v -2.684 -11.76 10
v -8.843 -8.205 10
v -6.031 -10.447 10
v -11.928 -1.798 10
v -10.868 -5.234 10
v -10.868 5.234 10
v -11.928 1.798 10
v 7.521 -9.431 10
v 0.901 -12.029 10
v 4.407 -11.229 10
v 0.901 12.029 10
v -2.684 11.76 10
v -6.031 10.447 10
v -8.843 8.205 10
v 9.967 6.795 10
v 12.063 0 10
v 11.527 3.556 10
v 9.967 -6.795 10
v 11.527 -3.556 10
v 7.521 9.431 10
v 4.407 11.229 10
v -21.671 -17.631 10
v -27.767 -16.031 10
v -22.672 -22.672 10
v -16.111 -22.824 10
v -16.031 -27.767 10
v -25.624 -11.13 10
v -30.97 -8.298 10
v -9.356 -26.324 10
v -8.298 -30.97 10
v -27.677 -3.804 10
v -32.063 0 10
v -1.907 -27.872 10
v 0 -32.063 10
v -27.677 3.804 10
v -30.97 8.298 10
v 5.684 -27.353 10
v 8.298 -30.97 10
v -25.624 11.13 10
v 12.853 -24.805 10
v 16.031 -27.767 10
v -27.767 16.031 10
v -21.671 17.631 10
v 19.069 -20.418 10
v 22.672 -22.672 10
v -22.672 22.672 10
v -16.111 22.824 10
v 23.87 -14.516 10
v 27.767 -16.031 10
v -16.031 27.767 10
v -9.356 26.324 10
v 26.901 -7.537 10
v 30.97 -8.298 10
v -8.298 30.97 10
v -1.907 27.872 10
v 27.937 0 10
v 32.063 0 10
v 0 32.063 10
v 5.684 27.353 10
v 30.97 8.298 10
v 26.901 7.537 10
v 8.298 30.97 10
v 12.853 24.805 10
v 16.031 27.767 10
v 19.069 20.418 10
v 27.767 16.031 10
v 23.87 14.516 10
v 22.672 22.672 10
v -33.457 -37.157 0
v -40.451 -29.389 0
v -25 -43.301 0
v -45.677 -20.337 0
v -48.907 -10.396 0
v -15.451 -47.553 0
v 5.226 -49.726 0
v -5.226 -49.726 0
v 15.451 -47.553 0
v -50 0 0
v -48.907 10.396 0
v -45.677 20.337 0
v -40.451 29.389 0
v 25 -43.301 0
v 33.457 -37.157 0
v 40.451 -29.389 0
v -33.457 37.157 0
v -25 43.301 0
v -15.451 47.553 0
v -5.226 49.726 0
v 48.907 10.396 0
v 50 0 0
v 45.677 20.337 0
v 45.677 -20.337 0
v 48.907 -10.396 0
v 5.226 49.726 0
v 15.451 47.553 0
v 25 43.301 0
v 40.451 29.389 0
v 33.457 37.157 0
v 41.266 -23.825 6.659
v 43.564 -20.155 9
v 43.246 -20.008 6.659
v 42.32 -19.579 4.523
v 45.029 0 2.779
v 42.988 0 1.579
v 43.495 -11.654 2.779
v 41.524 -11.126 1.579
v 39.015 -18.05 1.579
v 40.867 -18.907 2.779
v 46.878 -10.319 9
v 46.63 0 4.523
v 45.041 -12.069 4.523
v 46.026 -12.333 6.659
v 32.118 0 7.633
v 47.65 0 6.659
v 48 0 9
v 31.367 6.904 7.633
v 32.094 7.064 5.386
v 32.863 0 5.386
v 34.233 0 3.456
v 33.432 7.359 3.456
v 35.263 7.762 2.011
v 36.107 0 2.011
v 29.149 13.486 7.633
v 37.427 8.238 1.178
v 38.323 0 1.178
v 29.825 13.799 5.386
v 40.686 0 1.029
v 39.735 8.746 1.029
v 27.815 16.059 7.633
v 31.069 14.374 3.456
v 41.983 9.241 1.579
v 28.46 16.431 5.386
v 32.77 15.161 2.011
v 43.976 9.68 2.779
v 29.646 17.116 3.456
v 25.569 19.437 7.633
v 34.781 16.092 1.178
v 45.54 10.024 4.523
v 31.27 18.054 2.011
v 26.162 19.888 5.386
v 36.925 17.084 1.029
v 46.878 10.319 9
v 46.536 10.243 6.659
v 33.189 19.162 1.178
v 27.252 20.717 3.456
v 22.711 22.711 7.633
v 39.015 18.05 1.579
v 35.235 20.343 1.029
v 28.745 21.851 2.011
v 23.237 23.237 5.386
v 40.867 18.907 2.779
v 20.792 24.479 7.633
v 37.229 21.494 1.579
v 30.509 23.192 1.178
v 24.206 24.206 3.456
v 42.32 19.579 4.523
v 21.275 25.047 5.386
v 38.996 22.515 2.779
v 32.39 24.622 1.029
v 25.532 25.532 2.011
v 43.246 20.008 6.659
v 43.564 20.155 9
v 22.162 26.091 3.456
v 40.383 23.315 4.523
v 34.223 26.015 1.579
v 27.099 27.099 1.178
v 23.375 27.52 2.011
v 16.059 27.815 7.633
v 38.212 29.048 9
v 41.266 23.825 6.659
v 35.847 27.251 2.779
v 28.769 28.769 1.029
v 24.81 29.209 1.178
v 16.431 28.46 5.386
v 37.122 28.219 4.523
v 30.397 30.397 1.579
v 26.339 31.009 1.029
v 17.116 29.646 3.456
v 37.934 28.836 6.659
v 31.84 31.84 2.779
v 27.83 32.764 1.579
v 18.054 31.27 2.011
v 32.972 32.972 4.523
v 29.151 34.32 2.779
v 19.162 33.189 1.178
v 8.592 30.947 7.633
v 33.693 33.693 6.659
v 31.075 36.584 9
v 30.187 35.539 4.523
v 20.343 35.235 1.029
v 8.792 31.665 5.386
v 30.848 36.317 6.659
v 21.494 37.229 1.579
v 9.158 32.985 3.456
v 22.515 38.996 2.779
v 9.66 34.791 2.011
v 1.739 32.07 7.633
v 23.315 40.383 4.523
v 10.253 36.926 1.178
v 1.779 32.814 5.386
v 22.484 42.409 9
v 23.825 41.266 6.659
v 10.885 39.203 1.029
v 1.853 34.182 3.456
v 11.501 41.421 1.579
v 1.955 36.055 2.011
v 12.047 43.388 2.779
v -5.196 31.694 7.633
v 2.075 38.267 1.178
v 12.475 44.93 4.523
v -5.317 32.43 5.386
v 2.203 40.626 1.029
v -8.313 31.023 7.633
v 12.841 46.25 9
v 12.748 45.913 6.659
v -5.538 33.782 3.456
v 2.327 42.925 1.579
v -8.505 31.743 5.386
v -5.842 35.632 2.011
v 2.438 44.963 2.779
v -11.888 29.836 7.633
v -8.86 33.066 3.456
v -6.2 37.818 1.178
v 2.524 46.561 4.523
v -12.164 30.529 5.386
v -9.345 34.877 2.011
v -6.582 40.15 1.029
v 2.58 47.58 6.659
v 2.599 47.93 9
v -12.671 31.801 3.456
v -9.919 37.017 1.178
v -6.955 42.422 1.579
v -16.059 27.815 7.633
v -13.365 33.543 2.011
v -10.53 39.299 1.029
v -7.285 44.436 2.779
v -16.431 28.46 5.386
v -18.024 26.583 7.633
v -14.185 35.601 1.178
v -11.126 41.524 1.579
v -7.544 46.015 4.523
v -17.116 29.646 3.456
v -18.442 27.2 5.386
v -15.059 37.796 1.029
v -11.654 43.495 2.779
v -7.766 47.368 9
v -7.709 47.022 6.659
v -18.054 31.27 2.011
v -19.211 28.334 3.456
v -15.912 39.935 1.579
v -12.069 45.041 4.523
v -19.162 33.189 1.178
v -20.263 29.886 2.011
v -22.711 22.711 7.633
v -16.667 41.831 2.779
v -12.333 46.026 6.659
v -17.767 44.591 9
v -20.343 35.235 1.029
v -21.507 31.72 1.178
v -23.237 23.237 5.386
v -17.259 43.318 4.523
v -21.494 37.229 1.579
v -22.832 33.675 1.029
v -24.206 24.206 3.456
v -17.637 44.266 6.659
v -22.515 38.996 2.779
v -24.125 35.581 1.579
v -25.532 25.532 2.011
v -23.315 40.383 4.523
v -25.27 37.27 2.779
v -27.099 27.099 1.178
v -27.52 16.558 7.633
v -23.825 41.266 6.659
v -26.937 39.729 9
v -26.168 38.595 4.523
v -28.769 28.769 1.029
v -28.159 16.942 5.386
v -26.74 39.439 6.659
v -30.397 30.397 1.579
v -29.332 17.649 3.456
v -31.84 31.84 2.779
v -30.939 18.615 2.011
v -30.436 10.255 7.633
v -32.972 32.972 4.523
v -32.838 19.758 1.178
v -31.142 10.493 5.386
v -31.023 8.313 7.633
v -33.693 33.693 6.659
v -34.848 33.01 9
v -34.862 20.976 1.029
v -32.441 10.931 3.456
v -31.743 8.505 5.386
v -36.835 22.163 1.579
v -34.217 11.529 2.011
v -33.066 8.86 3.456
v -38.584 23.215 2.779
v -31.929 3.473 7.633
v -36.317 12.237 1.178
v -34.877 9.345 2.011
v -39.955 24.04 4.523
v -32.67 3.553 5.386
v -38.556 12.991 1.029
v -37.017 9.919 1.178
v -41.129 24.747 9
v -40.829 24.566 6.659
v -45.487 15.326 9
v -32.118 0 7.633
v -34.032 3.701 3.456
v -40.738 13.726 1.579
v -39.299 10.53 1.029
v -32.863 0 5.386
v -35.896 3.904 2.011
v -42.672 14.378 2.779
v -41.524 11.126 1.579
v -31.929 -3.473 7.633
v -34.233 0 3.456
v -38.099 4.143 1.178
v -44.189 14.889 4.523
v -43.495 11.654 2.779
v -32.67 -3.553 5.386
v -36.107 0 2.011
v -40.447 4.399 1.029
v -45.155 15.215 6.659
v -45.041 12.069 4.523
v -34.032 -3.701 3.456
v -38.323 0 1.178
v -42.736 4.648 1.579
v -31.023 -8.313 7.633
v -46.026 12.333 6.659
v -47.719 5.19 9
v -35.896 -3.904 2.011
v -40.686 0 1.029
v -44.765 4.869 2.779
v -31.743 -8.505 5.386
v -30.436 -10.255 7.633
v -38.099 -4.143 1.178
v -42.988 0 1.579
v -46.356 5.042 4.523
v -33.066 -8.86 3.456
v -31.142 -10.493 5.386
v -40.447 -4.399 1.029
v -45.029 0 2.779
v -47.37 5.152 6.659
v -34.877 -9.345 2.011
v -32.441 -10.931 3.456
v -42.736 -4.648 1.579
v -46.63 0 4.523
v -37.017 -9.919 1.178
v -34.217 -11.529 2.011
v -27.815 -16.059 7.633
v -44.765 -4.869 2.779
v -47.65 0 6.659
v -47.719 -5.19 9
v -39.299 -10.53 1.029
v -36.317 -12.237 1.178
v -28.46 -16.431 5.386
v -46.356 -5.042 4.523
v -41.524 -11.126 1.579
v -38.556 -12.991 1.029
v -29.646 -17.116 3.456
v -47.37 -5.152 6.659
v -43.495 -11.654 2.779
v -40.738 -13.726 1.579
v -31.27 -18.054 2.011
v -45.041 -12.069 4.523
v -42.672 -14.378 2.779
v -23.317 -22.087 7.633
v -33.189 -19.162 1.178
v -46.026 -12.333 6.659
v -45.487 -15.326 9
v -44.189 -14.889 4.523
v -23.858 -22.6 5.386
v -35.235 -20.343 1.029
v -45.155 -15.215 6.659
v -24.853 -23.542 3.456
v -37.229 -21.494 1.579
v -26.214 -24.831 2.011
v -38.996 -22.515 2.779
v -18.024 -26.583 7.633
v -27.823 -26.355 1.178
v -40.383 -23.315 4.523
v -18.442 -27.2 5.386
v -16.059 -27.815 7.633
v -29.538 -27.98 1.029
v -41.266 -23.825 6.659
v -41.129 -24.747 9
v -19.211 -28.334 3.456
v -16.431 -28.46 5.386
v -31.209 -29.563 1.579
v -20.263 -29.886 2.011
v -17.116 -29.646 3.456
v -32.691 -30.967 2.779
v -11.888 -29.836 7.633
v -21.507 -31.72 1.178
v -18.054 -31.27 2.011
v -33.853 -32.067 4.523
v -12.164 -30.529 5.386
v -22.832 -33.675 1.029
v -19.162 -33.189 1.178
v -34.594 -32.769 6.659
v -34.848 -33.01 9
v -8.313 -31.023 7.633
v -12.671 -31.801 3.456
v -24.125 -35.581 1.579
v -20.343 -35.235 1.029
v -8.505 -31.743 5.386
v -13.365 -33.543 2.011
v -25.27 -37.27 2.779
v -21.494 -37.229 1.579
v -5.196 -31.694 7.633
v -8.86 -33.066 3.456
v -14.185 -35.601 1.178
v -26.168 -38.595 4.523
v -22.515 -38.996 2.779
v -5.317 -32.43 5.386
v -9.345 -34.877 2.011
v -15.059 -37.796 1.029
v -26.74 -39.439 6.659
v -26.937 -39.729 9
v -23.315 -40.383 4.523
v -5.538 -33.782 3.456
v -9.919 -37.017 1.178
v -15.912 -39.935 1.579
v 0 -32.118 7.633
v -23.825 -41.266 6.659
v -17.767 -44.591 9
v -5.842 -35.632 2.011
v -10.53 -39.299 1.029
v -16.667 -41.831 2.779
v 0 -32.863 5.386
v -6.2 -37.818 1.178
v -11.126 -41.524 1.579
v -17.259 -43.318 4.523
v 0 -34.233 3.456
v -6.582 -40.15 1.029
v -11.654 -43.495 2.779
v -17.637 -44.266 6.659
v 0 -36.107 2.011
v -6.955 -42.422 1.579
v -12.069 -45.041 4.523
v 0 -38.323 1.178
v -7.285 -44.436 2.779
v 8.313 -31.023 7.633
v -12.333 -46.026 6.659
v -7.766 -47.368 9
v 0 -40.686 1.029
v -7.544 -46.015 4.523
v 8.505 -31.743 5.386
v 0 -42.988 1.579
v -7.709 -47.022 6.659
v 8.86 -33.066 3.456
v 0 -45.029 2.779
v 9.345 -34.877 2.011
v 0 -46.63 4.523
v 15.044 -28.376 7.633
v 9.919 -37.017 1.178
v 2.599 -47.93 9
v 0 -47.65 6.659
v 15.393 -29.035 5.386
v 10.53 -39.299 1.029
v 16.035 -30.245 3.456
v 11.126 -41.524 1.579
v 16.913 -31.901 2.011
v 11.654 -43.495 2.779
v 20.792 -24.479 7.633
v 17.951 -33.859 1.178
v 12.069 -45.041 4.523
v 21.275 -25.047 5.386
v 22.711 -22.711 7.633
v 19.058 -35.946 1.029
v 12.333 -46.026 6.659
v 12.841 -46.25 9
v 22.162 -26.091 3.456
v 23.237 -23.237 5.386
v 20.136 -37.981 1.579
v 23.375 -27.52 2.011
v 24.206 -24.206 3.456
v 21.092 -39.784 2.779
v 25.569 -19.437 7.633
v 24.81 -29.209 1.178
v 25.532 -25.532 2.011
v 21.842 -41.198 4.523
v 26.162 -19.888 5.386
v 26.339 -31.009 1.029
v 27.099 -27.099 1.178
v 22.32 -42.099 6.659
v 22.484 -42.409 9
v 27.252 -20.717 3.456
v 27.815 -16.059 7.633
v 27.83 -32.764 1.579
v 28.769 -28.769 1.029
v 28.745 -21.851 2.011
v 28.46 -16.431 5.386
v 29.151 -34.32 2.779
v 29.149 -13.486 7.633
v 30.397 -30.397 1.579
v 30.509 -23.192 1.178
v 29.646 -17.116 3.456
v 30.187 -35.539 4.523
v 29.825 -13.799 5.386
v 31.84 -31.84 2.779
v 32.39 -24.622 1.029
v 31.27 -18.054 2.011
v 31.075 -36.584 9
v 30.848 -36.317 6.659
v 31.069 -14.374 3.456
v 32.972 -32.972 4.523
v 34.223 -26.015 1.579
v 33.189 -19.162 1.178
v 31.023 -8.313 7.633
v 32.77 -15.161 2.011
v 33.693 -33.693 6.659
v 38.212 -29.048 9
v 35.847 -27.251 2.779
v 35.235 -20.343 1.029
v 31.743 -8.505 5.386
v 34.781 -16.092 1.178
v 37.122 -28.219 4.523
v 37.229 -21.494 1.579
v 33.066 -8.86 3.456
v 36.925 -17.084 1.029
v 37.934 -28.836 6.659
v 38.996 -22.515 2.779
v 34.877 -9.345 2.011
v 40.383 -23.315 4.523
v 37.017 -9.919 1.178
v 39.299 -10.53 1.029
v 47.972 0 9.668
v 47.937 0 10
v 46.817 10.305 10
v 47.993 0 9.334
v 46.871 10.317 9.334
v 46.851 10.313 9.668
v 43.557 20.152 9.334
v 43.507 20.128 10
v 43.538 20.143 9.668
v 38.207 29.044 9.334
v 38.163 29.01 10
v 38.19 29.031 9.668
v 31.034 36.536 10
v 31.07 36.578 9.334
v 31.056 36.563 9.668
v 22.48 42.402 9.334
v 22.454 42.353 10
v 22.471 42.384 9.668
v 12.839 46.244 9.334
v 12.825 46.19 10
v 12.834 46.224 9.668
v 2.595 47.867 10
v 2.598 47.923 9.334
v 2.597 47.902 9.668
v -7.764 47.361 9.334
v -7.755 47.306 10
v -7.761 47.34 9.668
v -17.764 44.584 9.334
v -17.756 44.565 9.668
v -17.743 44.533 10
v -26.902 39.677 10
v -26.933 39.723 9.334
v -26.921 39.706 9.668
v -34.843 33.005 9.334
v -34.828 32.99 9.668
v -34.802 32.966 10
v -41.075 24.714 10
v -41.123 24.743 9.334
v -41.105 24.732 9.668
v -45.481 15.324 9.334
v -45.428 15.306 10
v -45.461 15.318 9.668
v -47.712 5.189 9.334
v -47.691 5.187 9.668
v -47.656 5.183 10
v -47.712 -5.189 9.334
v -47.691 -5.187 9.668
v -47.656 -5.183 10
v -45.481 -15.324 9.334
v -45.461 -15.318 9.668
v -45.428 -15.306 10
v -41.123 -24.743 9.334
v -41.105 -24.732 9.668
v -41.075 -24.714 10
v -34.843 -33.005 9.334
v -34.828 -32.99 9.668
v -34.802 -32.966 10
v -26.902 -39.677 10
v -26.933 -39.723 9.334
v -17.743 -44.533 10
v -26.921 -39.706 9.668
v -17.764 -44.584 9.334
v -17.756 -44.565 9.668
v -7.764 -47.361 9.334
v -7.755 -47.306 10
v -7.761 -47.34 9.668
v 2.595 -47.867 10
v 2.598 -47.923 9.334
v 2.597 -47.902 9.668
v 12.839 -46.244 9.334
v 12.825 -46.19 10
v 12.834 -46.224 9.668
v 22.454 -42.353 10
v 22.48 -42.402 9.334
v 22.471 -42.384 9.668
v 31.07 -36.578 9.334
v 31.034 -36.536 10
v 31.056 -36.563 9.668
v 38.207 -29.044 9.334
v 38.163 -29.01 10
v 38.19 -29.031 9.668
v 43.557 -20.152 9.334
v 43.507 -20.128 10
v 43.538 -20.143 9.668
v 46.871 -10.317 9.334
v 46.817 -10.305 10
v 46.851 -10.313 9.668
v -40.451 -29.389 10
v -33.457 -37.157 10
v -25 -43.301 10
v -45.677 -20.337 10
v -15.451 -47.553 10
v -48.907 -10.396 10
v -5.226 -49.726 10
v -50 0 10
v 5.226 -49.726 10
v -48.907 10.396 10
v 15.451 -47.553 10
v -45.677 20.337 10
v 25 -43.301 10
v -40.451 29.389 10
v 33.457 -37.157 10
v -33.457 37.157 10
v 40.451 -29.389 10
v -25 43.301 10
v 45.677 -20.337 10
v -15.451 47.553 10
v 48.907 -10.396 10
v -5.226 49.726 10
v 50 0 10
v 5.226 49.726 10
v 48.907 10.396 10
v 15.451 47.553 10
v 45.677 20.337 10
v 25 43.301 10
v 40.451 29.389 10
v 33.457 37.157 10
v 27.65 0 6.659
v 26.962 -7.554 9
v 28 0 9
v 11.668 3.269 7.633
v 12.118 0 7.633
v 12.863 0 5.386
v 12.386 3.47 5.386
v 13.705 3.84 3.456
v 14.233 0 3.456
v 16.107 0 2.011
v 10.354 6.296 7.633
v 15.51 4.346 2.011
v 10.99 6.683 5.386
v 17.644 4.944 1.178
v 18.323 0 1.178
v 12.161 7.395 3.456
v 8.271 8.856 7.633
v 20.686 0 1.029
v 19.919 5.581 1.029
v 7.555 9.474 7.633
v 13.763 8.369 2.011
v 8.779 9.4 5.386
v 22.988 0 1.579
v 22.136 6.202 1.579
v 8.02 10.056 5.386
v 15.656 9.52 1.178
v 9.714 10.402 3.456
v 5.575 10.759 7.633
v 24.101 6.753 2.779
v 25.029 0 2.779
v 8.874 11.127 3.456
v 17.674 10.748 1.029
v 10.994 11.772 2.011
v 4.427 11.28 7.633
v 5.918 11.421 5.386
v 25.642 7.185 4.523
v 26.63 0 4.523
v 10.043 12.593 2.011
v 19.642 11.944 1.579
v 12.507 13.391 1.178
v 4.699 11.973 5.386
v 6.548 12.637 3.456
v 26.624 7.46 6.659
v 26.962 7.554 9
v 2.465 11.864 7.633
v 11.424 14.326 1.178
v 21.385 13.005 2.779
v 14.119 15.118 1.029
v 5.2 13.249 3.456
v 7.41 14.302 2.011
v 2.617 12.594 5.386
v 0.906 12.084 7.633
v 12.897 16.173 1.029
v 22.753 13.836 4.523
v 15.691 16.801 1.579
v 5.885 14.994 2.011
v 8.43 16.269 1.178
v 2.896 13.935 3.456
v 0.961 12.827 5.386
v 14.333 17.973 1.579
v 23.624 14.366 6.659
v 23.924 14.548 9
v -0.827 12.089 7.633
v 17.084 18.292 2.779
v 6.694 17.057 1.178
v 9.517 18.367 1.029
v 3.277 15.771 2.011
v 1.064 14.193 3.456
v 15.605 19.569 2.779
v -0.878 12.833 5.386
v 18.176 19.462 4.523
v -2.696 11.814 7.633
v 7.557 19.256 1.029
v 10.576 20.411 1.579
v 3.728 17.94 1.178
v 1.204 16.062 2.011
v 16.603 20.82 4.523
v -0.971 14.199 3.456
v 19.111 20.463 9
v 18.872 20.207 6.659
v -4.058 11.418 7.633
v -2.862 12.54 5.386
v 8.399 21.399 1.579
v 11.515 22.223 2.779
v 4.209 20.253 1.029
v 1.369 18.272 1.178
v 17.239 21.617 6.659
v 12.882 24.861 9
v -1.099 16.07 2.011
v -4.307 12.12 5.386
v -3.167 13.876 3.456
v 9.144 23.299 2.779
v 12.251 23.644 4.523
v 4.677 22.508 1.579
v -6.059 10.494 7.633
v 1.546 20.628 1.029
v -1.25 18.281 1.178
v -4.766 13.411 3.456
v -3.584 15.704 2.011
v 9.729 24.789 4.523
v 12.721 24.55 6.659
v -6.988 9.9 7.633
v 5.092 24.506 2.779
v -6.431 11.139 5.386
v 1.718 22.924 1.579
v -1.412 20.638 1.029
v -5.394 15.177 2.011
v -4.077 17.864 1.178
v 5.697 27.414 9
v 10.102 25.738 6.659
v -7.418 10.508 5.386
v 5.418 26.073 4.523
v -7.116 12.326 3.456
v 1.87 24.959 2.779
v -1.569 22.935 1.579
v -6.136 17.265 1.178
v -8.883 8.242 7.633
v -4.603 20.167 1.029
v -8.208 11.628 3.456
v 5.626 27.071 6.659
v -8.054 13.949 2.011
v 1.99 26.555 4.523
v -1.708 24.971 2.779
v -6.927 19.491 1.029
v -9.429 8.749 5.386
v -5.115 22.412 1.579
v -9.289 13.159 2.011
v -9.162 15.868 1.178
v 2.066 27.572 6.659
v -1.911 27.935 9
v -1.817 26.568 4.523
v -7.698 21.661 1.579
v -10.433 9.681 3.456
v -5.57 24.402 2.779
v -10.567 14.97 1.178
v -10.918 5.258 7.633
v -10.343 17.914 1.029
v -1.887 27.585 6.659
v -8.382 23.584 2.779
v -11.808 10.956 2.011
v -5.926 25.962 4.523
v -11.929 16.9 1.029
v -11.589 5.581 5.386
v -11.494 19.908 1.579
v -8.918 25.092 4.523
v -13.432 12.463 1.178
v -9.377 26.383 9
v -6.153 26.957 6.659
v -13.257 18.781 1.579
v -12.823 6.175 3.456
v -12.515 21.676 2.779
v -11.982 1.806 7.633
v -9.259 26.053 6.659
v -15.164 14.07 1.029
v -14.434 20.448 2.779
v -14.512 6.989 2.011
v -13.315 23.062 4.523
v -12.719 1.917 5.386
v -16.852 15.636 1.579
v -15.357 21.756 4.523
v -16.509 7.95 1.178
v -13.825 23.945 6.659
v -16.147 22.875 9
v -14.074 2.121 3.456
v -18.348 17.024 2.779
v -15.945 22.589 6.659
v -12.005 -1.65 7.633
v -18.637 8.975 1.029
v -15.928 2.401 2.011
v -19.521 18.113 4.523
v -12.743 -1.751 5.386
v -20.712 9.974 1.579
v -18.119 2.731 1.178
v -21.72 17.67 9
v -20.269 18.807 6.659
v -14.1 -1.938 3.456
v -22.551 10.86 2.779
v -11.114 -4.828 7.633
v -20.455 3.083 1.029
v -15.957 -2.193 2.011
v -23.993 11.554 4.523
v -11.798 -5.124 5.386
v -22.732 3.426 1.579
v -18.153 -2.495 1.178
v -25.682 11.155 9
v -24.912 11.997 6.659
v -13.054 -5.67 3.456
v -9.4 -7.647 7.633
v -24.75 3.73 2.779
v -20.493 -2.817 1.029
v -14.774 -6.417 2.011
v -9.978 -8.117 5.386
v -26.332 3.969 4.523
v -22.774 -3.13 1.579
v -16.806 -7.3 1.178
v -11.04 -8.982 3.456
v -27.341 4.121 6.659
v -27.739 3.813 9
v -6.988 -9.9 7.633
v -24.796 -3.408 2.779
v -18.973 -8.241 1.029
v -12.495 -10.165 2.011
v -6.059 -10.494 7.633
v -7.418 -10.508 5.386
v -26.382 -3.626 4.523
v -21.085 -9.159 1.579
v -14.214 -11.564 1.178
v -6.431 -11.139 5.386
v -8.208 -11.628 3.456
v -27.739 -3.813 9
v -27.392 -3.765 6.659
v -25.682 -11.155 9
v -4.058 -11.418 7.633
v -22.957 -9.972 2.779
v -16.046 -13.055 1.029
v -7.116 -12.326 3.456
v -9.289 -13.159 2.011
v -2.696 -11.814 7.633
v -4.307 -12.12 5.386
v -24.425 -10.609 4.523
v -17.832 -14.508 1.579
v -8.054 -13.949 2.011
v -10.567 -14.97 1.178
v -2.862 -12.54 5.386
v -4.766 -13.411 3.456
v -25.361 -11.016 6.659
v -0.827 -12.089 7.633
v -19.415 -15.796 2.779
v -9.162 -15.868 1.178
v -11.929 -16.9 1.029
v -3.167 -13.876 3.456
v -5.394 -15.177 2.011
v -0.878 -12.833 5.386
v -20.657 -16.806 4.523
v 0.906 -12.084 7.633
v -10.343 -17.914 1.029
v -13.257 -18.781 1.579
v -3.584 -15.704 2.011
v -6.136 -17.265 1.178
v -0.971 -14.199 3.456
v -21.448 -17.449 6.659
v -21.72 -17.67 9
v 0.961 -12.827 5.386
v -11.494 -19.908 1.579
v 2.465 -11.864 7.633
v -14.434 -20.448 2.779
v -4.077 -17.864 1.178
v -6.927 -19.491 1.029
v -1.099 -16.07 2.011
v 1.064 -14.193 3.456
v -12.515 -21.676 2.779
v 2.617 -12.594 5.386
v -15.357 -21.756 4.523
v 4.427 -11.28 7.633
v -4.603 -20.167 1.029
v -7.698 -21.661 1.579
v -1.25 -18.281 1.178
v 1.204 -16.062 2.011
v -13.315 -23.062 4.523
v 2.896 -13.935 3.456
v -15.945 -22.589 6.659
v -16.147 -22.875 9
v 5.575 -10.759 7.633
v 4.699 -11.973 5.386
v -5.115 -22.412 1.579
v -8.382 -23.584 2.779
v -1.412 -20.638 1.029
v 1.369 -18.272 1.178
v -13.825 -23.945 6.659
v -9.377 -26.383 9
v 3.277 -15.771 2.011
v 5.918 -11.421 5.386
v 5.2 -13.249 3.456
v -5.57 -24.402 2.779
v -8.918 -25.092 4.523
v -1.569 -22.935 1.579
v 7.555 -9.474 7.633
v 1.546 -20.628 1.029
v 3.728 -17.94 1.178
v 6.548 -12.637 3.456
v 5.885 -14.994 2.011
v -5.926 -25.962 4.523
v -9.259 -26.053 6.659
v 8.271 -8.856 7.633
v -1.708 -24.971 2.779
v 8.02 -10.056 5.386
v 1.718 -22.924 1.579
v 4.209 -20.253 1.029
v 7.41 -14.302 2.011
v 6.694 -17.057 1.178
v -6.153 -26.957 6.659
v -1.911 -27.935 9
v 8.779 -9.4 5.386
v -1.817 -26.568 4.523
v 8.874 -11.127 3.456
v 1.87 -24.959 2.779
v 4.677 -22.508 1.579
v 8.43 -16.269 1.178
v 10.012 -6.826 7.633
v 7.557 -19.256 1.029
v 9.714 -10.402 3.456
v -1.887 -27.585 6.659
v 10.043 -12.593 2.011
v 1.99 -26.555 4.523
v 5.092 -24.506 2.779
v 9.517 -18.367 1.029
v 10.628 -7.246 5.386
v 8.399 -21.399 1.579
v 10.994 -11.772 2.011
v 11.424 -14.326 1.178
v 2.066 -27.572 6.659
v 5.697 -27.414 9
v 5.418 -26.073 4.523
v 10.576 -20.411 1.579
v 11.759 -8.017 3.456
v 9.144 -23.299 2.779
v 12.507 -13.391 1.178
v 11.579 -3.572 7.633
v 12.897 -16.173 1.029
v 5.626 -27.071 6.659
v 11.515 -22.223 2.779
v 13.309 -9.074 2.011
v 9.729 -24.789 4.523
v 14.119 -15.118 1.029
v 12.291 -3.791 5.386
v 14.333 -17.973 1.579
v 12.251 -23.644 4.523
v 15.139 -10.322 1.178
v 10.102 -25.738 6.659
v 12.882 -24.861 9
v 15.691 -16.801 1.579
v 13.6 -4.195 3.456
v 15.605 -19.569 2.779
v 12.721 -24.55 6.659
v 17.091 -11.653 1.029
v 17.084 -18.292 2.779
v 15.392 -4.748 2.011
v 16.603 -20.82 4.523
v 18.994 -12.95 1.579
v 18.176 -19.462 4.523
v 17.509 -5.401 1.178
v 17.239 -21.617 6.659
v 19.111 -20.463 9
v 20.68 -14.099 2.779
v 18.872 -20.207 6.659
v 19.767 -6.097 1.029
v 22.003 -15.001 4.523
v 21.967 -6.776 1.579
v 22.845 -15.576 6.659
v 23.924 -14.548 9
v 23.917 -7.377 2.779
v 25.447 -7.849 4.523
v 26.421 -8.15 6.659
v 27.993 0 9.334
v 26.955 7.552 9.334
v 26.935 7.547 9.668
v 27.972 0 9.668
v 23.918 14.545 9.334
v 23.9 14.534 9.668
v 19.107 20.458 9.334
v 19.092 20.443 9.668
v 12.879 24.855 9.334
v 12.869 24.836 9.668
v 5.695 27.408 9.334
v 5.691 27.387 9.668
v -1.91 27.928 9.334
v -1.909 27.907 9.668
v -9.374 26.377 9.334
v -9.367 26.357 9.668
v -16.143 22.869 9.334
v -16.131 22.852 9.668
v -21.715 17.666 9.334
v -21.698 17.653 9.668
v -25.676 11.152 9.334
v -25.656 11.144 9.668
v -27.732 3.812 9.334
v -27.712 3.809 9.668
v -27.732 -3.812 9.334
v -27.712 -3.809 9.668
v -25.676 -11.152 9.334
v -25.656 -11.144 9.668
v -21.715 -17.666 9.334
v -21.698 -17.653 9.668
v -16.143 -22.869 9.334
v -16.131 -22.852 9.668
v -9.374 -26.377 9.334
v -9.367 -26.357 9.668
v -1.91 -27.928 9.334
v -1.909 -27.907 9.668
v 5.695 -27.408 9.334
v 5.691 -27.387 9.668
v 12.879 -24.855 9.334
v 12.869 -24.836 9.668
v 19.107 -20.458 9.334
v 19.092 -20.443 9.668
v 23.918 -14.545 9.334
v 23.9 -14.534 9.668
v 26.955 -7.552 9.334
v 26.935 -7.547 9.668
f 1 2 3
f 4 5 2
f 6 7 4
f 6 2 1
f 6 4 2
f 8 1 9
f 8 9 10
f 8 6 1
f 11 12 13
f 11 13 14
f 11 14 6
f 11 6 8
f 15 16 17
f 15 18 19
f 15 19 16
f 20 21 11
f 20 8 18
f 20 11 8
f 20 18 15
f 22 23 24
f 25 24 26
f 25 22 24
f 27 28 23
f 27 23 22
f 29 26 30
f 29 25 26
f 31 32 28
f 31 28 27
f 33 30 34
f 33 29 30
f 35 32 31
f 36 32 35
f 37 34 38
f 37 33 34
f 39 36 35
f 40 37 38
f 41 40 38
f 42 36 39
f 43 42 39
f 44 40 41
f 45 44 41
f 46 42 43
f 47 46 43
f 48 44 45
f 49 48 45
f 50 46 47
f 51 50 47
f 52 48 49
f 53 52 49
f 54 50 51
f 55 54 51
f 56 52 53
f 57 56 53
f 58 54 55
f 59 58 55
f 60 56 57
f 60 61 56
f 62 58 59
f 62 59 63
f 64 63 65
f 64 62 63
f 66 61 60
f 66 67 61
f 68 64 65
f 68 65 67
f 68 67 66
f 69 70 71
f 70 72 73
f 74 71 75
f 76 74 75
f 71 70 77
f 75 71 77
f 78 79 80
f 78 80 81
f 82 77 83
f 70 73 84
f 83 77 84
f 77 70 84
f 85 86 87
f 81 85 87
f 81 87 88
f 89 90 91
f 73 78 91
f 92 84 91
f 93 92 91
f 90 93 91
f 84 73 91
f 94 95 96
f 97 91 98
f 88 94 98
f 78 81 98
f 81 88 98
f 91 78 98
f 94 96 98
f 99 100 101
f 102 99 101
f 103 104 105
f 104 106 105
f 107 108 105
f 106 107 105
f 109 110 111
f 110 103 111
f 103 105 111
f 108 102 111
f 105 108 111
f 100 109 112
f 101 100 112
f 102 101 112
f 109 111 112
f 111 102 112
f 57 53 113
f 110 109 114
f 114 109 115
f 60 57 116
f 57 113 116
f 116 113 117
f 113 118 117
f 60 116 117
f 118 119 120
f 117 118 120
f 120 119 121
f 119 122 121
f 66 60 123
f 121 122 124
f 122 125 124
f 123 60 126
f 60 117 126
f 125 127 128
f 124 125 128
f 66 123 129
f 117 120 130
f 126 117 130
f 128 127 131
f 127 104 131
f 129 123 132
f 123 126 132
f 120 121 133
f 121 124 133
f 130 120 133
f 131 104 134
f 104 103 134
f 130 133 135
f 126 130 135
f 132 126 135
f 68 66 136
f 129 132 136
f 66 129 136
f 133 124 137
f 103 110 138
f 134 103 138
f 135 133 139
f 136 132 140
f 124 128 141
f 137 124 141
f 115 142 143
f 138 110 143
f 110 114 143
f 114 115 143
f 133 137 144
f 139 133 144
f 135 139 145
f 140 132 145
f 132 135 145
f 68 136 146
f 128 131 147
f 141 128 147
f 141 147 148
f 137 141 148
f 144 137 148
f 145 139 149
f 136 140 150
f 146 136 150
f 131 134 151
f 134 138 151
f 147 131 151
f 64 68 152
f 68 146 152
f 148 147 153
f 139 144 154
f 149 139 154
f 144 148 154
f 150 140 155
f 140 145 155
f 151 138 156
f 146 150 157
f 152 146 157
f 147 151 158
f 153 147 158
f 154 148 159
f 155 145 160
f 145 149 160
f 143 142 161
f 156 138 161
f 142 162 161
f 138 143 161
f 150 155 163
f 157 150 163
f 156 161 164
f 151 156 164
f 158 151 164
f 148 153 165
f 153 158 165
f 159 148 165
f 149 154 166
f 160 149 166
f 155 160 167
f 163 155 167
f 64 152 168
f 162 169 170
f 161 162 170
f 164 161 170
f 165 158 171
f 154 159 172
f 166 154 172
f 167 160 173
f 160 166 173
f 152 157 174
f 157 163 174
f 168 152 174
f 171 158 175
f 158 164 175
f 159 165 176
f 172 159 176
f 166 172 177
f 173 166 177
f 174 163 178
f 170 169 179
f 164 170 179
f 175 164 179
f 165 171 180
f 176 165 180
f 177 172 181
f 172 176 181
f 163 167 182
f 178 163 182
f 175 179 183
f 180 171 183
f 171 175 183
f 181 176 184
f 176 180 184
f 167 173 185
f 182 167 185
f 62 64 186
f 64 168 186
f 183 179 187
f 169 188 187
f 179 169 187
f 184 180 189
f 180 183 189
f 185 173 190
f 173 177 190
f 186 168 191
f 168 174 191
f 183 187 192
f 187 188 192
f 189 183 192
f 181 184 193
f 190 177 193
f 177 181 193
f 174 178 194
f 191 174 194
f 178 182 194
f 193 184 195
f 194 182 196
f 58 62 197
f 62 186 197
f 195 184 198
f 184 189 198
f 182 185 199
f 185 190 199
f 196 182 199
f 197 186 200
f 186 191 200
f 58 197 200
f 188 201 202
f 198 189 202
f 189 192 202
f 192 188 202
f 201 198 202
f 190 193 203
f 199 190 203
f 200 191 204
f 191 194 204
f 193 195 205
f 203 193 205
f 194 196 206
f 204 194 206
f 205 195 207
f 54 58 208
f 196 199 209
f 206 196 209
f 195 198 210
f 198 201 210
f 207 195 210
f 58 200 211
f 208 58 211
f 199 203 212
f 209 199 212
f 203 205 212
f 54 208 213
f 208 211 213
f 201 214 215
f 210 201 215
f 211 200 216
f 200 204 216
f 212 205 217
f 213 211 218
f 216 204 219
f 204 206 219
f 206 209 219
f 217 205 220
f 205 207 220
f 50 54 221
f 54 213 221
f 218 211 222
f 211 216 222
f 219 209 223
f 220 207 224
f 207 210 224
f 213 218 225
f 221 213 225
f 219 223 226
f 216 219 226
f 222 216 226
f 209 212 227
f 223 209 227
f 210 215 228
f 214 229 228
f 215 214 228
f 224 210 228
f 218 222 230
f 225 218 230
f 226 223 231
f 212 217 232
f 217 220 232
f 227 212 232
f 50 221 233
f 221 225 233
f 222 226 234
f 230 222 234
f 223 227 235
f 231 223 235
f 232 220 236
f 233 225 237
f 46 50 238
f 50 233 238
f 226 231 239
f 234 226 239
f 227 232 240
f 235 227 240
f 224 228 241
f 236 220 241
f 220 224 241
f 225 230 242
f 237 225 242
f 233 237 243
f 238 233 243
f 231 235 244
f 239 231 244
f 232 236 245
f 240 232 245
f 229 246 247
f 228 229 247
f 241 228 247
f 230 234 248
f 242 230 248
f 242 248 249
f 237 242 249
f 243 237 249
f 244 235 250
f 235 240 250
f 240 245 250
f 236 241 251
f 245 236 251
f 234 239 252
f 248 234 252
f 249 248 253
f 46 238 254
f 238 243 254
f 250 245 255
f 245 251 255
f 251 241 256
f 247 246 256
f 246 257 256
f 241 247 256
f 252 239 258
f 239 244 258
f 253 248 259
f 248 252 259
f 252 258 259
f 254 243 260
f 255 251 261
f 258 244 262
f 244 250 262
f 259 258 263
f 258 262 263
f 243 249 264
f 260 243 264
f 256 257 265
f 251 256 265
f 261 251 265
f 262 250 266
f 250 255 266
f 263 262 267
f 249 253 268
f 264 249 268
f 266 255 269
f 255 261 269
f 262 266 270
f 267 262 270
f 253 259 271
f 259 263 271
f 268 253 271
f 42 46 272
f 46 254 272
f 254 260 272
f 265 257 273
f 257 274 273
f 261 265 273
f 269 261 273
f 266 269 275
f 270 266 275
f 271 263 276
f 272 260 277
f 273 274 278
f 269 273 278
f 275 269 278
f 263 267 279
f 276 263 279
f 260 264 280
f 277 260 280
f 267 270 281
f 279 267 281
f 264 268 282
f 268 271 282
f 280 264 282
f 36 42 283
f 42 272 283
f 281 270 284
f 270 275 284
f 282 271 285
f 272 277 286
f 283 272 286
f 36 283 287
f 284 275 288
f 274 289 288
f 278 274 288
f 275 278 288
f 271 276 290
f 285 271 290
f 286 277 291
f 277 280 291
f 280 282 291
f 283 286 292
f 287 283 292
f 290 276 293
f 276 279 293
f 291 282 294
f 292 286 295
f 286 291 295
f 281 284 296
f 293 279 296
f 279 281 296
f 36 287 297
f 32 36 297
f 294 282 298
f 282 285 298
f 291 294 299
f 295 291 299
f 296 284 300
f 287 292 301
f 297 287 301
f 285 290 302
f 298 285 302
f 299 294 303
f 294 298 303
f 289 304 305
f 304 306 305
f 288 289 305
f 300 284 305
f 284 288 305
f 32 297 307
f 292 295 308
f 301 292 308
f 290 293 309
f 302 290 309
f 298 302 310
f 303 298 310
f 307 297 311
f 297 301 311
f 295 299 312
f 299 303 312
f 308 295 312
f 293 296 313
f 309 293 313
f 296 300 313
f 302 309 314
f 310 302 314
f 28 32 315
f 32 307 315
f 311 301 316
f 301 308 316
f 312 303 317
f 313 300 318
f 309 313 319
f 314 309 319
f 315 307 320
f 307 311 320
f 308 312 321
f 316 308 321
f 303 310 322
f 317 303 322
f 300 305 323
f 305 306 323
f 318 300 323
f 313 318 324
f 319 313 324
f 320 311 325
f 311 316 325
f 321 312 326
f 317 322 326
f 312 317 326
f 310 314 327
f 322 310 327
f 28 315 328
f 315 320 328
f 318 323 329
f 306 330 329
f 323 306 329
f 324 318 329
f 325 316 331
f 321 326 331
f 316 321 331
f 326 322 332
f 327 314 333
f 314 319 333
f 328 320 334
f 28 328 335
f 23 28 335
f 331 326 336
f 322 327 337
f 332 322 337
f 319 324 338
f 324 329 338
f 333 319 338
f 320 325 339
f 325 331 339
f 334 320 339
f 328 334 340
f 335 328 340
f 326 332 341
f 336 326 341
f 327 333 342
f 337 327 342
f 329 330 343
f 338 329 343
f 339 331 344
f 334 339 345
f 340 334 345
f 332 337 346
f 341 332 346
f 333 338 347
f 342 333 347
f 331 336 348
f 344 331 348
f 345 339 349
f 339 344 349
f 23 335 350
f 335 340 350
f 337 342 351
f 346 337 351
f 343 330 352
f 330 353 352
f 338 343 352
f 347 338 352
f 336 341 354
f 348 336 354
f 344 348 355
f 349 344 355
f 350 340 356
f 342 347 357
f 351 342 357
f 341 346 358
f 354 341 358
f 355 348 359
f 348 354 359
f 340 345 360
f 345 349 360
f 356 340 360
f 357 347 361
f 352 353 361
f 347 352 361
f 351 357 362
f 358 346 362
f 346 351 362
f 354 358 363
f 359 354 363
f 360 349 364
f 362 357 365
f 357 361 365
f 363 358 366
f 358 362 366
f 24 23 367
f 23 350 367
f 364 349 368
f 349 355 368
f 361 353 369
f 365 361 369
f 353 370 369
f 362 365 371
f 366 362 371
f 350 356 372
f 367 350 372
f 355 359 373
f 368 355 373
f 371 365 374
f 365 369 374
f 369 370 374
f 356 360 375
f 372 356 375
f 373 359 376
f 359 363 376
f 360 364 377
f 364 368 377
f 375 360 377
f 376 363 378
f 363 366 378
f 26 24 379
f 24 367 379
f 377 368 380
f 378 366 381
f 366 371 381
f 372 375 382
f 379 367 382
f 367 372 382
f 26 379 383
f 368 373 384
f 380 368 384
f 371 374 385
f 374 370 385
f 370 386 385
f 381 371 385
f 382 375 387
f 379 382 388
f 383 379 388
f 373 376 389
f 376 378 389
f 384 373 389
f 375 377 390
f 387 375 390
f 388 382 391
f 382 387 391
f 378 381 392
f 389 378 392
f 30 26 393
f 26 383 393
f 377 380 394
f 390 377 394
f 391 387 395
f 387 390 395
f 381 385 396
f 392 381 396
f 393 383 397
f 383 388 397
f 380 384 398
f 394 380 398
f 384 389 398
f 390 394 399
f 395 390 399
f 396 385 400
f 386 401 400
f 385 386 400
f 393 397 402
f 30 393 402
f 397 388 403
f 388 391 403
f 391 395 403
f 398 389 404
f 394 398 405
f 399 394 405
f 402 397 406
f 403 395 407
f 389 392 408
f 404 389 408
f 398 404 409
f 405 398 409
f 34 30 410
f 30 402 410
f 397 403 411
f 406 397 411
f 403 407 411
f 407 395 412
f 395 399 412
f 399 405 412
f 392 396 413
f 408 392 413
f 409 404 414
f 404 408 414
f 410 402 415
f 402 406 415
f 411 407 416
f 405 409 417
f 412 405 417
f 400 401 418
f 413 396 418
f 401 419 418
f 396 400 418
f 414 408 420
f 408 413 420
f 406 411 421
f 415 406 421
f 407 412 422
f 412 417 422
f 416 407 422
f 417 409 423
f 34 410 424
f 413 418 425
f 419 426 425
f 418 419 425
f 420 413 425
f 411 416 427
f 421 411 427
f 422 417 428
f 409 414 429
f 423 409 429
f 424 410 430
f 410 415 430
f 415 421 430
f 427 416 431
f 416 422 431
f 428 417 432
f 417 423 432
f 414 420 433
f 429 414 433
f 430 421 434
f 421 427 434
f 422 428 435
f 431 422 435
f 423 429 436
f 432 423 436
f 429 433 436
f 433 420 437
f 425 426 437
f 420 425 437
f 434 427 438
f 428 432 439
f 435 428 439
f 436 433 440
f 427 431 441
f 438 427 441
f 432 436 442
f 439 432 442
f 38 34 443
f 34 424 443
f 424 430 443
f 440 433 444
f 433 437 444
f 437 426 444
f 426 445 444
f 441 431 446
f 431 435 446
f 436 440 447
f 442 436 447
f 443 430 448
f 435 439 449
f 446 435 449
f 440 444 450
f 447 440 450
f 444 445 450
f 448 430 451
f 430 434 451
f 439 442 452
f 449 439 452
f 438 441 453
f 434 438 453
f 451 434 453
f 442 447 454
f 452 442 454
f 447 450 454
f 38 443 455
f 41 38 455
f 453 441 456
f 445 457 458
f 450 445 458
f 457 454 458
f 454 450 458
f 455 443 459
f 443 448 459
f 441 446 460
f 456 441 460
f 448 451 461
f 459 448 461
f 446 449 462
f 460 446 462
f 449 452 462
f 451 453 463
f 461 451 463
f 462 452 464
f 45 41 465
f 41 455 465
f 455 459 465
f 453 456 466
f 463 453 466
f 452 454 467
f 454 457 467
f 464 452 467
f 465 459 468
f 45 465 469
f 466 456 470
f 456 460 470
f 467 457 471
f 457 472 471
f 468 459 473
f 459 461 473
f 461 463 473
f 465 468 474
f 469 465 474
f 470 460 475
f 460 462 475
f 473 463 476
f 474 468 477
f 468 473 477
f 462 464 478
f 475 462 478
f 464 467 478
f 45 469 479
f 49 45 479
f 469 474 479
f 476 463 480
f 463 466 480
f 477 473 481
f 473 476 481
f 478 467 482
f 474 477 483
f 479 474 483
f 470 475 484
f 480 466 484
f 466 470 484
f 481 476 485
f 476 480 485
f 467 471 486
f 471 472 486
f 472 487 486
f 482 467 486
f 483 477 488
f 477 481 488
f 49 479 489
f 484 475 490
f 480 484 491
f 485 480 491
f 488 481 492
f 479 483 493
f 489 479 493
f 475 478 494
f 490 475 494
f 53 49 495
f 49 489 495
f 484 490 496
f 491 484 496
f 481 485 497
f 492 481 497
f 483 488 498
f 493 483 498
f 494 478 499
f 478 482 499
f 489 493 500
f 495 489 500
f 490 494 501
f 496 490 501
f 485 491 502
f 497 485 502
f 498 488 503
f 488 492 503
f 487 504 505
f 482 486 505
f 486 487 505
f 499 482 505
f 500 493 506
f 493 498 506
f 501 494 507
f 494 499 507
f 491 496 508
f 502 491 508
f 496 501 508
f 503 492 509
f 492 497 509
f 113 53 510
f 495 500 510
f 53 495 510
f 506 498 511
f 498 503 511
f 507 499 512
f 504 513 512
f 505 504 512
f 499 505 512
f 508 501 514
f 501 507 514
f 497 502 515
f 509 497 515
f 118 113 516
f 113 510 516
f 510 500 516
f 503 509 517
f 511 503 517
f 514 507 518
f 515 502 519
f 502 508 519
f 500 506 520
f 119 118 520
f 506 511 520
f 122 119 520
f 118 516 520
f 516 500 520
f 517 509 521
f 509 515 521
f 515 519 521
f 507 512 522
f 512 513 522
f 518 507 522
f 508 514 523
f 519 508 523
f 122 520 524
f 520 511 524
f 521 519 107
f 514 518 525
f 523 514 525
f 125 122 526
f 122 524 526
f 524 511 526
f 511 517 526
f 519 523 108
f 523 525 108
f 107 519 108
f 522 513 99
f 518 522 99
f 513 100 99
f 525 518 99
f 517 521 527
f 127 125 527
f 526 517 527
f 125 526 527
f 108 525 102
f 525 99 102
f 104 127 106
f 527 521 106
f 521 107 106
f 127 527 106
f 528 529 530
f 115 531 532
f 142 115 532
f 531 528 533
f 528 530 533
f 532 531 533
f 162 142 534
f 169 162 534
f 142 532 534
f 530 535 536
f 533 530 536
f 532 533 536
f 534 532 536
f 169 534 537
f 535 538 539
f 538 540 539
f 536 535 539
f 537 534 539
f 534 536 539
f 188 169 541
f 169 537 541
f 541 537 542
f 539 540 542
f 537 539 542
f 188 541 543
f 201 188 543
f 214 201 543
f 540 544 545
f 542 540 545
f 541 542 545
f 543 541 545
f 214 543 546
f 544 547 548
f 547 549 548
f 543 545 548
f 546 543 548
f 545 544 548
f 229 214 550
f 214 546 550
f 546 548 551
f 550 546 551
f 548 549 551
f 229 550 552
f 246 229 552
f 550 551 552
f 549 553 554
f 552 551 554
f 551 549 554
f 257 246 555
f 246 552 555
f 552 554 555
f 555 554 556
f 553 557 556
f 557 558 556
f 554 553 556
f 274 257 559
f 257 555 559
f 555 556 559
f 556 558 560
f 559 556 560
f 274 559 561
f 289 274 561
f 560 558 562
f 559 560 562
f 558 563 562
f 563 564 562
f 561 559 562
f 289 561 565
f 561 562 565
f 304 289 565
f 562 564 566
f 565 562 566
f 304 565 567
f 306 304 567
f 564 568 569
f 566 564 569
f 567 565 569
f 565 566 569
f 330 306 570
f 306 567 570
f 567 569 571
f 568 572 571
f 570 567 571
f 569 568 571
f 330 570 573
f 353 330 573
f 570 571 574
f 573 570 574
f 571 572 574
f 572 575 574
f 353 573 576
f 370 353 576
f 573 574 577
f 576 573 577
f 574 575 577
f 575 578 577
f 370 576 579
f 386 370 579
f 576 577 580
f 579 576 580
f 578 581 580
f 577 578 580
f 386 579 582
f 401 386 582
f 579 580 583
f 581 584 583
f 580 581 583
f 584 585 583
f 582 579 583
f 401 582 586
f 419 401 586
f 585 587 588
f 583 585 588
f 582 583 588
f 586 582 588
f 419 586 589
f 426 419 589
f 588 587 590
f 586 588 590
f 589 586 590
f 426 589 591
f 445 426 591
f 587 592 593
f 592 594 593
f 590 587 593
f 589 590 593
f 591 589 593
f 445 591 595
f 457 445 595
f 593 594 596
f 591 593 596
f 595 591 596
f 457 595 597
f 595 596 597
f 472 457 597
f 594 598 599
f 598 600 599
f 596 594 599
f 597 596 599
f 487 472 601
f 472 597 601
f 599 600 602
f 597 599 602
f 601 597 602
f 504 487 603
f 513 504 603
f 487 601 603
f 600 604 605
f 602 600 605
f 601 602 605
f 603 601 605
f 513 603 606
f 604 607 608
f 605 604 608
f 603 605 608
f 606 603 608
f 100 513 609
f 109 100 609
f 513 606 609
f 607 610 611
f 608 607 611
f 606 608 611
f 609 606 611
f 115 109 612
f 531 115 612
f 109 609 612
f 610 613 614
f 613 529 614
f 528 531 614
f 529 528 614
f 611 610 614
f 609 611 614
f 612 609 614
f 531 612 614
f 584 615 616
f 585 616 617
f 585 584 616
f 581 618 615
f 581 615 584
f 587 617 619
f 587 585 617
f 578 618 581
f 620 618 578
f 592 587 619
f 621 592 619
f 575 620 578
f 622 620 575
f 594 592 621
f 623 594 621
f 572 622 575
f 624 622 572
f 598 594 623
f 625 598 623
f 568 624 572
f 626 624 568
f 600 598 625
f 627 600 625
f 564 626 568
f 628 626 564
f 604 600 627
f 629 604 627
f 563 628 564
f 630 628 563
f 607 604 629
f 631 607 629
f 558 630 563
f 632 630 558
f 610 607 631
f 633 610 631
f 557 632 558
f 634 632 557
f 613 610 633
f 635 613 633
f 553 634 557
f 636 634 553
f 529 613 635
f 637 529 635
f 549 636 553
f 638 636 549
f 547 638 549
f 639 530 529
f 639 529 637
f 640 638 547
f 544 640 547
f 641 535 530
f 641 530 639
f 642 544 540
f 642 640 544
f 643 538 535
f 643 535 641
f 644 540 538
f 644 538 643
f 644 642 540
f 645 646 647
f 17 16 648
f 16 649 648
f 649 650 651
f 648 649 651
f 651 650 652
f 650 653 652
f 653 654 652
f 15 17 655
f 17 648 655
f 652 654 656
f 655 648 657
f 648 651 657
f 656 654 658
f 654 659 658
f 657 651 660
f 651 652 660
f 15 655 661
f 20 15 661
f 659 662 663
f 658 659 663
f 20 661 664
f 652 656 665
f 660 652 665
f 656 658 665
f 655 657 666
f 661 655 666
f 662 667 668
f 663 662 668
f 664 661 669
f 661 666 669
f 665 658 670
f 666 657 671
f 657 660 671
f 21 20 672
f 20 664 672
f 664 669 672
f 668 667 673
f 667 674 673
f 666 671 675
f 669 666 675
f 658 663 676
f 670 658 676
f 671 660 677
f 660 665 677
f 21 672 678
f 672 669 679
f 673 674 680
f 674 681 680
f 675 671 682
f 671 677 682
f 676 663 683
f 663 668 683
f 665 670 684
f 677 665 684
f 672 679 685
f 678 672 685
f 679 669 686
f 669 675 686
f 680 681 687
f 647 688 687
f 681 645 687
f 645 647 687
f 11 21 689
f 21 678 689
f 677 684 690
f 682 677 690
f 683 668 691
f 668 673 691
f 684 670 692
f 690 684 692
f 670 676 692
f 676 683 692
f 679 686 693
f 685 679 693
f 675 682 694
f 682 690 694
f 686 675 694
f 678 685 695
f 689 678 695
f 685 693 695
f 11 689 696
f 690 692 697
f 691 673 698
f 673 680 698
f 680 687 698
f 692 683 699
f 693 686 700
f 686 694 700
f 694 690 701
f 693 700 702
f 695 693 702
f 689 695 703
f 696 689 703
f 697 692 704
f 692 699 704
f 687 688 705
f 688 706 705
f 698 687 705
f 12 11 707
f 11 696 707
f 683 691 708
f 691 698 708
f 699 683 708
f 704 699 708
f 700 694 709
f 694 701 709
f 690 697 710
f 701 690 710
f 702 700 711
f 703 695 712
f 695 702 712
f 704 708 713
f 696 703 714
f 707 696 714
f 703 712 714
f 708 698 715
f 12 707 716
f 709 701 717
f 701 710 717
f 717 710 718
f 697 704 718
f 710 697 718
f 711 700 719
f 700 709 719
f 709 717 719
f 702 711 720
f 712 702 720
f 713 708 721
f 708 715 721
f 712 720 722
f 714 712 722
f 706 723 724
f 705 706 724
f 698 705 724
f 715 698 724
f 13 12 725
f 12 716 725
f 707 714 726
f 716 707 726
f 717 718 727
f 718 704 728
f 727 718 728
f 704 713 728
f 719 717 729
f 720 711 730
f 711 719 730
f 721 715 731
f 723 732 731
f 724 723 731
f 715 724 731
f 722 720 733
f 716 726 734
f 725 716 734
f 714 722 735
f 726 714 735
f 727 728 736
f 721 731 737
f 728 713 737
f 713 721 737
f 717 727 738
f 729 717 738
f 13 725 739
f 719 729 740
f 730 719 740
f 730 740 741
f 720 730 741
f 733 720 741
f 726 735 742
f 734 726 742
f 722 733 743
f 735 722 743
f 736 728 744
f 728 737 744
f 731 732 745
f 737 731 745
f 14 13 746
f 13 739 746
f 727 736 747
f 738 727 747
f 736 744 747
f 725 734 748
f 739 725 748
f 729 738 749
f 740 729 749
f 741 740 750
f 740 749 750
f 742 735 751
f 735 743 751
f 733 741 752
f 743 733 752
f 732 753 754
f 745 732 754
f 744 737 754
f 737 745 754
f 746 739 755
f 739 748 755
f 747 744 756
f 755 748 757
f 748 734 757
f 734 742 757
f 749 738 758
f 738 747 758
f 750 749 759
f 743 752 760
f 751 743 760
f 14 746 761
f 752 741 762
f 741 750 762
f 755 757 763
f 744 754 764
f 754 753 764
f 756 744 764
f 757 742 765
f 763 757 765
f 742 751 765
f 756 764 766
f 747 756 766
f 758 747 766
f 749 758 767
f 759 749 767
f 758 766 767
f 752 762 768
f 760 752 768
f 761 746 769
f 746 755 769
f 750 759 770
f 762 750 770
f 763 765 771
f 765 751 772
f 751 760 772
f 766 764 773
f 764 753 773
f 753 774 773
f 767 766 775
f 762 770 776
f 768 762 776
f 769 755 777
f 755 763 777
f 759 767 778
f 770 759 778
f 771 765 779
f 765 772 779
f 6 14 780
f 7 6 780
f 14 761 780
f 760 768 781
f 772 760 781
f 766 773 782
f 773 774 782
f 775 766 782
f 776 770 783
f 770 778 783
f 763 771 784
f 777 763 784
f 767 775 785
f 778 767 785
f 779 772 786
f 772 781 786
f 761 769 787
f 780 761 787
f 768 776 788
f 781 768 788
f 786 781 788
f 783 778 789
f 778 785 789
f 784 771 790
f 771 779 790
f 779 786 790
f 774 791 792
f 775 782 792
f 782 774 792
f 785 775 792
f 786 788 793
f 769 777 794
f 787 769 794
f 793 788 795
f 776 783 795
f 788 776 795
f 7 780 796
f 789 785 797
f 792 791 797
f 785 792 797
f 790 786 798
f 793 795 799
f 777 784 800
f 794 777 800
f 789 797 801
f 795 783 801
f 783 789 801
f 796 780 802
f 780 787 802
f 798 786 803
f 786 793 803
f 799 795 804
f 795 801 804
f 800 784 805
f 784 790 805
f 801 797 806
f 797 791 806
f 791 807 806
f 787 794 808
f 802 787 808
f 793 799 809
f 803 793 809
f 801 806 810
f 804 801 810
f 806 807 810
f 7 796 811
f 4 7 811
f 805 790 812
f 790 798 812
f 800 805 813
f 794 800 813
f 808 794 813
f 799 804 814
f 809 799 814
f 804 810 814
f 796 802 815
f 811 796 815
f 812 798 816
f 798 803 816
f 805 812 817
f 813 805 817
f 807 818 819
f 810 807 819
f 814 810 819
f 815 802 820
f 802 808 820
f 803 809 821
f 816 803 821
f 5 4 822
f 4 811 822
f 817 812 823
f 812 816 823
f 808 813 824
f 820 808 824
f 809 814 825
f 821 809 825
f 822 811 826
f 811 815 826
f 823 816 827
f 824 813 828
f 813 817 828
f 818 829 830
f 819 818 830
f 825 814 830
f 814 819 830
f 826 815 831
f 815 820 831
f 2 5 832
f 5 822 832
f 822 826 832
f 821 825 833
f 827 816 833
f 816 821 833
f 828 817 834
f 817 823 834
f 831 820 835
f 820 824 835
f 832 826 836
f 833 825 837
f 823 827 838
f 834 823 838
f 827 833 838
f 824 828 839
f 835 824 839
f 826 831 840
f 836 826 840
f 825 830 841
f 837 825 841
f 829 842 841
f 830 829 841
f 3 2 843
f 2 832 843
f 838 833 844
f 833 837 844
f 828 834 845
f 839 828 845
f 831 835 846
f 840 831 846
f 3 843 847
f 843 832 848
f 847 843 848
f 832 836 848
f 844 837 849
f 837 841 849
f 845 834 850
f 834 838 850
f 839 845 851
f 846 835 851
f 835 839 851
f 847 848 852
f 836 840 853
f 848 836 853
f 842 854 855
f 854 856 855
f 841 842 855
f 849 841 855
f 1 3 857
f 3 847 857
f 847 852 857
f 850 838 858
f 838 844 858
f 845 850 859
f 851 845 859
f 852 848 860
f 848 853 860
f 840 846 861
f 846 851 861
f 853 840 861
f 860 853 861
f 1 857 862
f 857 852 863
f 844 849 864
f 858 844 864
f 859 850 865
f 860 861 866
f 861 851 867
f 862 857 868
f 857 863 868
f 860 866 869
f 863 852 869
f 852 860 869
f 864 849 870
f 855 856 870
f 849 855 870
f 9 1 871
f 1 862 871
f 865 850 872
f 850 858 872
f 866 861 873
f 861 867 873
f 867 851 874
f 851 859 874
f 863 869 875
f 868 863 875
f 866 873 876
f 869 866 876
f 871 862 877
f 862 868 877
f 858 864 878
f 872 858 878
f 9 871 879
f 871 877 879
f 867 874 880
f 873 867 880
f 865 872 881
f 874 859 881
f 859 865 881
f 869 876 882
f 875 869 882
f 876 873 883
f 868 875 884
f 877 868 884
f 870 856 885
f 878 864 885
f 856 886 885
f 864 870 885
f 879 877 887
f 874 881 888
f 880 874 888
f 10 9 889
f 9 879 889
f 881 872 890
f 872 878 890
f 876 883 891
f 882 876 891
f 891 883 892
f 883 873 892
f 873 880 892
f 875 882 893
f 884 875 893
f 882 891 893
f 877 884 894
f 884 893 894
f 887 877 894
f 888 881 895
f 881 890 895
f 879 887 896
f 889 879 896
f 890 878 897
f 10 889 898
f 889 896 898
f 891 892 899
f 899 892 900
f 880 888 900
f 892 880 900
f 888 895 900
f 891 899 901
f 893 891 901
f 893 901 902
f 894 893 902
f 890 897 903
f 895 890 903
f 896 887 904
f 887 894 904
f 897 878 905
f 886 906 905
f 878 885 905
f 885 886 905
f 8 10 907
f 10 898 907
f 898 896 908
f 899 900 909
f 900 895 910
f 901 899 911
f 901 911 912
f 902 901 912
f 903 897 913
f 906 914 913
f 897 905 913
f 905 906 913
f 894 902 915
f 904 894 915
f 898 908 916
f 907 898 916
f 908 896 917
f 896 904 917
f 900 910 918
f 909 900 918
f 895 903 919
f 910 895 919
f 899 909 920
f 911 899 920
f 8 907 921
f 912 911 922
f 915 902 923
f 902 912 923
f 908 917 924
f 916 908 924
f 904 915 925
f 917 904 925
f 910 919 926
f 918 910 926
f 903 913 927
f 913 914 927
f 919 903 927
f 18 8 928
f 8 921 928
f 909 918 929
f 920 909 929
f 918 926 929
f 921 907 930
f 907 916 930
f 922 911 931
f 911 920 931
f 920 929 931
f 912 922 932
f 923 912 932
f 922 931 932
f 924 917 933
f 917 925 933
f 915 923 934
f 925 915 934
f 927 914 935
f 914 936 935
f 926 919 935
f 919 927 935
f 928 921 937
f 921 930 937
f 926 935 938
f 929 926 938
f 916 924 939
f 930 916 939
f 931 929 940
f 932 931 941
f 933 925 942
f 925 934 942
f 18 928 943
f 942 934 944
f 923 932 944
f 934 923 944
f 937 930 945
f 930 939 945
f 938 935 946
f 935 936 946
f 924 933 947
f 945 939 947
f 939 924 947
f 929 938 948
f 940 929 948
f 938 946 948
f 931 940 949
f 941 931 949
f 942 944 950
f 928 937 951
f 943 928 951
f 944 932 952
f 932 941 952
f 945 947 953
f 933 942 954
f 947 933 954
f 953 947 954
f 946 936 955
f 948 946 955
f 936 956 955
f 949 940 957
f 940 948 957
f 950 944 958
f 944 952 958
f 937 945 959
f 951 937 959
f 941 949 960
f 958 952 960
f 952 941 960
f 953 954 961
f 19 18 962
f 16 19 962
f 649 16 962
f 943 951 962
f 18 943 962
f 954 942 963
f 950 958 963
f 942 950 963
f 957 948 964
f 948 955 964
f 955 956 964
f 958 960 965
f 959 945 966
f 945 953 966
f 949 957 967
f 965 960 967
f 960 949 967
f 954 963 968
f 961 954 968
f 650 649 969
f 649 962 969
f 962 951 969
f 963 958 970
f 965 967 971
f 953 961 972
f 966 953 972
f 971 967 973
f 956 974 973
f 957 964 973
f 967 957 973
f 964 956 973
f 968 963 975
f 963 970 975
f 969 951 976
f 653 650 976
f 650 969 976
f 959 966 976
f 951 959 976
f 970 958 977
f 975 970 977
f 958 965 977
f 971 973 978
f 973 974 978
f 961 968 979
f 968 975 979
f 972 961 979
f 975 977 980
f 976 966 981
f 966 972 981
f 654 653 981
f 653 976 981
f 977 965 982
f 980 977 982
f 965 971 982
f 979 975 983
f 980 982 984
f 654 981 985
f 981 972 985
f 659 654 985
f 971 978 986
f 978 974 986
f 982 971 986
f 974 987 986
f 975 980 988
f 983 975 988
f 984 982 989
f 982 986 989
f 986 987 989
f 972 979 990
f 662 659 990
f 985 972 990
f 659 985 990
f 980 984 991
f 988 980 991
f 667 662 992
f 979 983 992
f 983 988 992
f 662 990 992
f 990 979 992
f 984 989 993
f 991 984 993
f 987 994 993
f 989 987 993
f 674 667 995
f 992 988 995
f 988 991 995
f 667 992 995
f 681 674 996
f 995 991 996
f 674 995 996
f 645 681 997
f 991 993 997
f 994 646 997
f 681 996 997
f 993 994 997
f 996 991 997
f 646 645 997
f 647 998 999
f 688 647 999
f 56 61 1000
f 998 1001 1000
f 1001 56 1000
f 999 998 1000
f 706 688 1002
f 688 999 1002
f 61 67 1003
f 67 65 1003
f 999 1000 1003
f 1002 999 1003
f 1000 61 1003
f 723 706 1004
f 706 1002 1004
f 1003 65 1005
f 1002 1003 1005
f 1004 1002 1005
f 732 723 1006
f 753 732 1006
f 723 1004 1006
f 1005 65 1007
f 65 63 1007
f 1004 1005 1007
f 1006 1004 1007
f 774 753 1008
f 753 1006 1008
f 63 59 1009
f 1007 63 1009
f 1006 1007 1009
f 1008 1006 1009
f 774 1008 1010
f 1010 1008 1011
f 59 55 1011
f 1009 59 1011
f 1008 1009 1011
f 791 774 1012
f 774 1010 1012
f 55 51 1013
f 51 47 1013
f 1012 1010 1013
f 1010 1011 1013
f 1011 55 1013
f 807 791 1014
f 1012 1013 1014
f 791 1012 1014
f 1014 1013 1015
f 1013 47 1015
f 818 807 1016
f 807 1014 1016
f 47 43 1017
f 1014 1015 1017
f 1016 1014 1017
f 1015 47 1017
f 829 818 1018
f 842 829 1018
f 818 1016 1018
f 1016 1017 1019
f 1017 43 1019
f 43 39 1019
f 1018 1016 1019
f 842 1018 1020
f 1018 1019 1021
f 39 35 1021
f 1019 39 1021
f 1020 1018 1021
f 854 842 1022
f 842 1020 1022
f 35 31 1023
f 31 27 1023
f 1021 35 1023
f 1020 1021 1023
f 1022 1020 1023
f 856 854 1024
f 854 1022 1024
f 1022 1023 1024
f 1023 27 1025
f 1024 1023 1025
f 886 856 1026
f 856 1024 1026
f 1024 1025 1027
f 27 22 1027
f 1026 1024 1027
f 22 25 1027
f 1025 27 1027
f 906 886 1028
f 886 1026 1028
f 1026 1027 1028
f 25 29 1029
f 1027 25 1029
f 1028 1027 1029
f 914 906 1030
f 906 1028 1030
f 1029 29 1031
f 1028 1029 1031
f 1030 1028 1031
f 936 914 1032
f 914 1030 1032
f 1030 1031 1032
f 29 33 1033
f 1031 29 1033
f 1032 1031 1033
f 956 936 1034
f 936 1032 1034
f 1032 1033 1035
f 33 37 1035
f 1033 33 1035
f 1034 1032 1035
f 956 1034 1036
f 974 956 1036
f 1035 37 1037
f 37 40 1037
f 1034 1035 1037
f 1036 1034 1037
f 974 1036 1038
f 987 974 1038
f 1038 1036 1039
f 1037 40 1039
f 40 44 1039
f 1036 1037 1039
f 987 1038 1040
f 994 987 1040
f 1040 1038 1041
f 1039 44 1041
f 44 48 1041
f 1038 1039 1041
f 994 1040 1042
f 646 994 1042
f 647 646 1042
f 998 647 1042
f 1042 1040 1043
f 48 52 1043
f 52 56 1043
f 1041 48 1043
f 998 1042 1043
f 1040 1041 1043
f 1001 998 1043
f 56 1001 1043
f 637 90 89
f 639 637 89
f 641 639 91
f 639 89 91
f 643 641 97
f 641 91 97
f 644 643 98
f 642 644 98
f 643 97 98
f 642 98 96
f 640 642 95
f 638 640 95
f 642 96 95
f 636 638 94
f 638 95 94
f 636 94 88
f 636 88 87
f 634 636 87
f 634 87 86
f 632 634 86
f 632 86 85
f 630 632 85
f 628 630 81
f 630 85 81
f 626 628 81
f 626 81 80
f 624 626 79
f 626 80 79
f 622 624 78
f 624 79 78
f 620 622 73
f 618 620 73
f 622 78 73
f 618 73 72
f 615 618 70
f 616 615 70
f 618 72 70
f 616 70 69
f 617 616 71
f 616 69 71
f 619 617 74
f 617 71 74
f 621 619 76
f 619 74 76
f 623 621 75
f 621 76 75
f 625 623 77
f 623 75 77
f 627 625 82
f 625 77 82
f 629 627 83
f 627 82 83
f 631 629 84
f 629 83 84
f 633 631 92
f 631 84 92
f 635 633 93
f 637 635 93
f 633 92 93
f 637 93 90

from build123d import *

# Parameters (mm, degrees)
TORUS_R        = 8
TORUS001_R     = 8
CYLINDER_R     = 50
CYLINDER_DEPTH = 10


with BuildPart() as canal_peque_a:
    # Torus → Torus (revolve)
    with BuildSketch(Plane(origin=(0, 0, 9), x_dir=(1, 0, 0), z_dir=(0, -1, 0))):
        with Locations((20, 0)):
            Circle(TORUS_R)
    revolve(axis=Axis((0, 0, 9), (0, 0, 1)))


with BuildPart() as canales:
    # Torus001 → Torus001 (revolve)
    with BuildSketch(Plane(origin=(0, 0, 9), x_dir=(1, 0, 0), z_dir=(0, -1, 0))):
        with Locations((40, 0)):
            Circle(TORUS001_R)
    revolve(axis=Axis((0, 0, 9), (0, 0, 1)))

    # Fusion: union Canal_pequeña
    add(canal_peque_a.part)


with BuildPart() as portacanicas:
    # Cylinder → Cylinder (new body)
    with BuildSketch(Plane.XY):
        Circle(CYLINDER_R)
    extrude(amount=CYLINDER_DEPTH)

    # Cut: cut Canales
    add(canales.part, mode=Mode.SUBTRACT)


solid = portacanicas.part
